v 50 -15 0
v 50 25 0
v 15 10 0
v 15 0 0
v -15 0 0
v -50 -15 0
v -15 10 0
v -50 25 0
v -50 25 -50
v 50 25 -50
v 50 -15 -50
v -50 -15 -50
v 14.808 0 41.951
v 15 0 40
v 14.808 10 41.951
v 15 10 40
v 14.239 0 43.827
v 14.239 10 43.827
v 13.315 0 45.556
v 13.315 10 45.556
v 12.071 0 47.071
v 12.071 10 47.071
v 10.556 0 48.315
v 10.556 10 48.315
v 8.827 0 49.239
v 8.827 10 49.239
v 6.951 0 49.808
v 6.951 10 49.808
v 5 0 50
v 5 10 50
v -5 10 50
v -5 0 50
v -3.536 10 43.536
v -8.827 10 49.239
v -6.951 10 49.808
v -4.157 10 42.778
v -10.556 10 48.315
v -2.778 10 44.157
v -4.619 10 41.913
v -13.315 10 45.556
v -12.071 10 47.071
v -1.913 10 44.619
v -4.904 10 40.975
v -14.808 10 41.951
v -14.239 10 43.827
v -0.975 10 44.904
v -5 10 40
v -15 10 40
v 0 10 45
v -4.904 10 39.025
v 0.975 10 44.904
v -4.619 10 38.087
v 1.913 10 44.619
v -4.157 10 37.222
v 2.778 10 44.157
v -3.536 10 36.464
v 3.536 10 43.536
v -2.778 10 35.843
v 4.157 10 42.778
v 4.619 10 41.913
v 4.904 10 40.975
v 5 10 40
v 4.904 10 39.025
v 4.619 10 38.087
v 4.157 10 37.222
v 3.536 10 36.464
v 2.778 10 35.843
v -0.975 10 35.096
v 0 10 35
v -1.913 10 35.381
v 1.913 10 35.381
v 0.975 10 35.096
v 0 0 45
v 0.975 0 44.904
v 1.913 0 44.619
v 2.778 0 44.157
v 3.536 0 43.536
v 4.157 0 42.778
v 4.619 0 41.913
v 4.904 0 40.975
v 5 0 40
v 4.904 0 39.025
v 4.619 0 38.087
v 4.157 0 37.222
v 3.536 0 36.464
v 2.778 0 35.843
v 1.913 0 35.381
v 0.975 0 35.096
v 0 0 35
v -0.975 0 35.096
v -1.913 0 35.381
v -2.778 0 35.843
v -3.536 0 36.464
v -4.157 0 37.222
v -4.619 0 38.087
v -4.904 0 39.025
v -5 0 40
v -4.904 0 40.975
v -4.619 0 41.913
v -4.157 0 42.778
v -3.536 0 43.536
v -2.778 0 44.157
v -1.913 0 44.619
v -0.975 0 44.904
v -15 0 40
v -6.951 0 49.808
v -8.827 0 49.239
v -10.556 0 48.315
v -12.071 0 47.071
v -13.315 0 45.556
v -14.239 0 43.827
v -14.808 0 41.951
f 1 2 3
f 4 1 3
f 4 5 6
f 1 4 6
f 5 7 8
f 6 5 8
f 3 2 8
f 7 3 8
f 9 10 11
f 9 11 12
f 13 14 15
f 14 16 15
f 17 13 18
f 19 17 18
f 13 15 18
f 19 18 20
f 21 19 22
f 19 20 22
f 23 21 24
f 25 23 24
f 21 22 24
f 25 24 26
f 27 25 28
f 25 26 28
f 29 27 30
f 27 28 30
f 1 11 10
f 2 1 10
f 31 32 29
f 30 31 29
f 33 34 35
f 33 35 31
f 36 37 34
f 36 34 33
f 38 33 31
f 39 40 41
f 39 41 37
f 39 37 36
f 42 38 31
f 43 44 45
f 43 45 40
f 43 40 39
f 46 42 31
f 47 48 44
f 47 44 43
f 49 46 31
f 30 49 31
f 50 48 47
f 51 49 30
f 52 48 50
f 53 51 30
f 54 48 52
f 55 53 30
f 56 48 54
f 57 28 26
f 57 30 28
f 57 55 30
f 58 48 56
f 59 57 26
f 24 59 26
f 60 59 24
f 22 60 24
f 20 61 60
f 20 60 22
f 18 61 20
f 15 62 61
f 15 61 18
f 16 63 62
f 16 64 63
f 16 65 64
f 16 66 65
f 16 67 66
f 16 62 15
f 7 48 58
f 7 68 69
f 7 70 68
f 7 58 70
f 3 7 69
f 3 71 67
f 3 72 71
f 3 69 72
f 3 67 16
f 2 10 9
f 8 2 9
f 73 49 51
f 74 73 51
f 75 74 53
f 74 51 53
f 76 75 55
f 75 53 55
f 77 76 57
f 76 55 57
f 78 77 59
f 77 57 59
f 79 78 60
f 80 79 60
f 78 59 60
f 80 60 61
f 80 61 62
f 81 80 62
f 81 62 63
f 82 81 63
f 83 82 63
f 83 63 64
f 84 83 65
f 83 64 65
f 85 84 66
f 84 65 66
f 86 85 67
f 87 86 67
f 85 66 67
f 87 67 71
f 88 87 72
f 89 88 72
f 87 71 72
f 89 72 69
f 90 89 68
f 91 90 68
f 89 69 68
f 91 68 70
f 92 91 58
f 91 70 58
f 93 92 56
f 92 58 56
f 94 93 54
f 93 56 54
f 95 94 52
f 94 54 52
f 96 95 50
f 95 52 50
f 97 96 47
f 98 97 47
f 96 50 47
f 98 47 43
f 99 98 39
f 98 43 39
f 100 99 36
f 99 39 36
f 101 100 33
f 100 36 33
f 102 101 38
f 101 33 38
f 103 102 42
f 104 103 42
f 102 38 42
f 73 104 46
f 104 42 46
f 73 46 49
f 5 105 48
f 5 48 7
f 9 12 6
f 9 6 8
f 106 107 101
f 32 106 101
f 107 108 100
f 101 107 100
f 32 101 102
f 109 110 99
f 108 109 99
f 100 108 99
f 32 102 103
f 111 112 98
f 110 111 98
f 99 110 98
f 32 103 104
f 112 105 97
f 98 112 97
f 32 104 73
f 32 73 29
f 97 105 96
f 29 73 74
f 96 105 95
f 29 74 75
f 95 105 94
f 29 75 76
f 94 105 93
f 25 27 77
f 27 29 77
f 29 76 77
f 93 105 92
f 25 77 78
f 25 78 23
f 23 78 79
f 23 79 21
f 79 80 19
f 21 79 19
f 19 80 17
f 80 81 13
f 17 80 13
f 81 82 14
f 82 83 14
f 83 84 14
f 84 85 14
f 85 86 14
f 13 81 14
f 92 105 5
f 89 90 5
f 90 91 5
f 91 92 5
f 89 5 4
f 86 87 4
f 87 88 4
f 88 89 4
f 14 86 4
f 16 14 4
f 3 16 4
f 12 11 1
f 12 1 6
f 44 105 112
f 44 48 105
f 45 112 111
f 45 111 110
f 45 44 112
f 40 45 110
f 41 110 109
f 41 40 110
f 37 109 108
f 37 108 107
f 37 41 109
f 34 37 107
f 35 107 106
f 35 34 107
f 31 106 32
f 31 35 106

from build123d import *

# Parameters (mm, degrees)
SKETCH1_W           = 30
SKETCH1_H           = 100
BOSS_EXTRUDE1_DEPTH = 10
SKETCH2_R           = 5
CUT_EXTRUDE1_DEPTH  = 10
SKETCH3_W           = 100
SKETCH3_H           = 40
BOSS_EXTRUDE2_DEPTH = 50
FILLET1_R           = 10


with BuildPart() as part:
    # Sketch1 → Boss-Extrude1 (new body)
    with BuildSketch(Plane(origin=(0, 0, 0), x_dir=(1, 0, 0), z_dir=(0, 1, 0))):
        Rectangle(SKETCH1_W, SKETCH1_H)
    extrude(amount=BOSS_EXTRUDE1_DEPTH)

    # Sketch2 → Cut-Extrude1 (cut)
    with BuildSketch(Plane(origin=(0, 10, 0), x_dir=(1, 0, 0), z_dir=(0, 1, 0))):
        with Locations(Location((0, -40, 0), (0, 0, 270))):
            Circle(SKETCH2_R)
    extrude(amount=-CUT_EXTRUDE1_DEPTH, mode=Mode.SUBTRACT)

    # Sketch3 → Boss-Extrude2 (add)
    with BuildSketch(Plane(origin=(0, 0, -50), x_dir=(-1, 0, 0), z_dir=(0, 0, -1))):
        with Locations((0, 5)):
            Rectangle(SKETCH3_W, SKETCH3_H)
    extrude(amount=-BOSS_EXTRUDE2_DEPTH)

    # Fillet1
    fillet1_edges = [part.edges().sort_by_distance(p)[0] for p in [
        (15, 5, 50),
        (-15, 5, 50),
    ]]
    fillet(fillet1_edges, radius=FILLET1_R)


solid = part.part
